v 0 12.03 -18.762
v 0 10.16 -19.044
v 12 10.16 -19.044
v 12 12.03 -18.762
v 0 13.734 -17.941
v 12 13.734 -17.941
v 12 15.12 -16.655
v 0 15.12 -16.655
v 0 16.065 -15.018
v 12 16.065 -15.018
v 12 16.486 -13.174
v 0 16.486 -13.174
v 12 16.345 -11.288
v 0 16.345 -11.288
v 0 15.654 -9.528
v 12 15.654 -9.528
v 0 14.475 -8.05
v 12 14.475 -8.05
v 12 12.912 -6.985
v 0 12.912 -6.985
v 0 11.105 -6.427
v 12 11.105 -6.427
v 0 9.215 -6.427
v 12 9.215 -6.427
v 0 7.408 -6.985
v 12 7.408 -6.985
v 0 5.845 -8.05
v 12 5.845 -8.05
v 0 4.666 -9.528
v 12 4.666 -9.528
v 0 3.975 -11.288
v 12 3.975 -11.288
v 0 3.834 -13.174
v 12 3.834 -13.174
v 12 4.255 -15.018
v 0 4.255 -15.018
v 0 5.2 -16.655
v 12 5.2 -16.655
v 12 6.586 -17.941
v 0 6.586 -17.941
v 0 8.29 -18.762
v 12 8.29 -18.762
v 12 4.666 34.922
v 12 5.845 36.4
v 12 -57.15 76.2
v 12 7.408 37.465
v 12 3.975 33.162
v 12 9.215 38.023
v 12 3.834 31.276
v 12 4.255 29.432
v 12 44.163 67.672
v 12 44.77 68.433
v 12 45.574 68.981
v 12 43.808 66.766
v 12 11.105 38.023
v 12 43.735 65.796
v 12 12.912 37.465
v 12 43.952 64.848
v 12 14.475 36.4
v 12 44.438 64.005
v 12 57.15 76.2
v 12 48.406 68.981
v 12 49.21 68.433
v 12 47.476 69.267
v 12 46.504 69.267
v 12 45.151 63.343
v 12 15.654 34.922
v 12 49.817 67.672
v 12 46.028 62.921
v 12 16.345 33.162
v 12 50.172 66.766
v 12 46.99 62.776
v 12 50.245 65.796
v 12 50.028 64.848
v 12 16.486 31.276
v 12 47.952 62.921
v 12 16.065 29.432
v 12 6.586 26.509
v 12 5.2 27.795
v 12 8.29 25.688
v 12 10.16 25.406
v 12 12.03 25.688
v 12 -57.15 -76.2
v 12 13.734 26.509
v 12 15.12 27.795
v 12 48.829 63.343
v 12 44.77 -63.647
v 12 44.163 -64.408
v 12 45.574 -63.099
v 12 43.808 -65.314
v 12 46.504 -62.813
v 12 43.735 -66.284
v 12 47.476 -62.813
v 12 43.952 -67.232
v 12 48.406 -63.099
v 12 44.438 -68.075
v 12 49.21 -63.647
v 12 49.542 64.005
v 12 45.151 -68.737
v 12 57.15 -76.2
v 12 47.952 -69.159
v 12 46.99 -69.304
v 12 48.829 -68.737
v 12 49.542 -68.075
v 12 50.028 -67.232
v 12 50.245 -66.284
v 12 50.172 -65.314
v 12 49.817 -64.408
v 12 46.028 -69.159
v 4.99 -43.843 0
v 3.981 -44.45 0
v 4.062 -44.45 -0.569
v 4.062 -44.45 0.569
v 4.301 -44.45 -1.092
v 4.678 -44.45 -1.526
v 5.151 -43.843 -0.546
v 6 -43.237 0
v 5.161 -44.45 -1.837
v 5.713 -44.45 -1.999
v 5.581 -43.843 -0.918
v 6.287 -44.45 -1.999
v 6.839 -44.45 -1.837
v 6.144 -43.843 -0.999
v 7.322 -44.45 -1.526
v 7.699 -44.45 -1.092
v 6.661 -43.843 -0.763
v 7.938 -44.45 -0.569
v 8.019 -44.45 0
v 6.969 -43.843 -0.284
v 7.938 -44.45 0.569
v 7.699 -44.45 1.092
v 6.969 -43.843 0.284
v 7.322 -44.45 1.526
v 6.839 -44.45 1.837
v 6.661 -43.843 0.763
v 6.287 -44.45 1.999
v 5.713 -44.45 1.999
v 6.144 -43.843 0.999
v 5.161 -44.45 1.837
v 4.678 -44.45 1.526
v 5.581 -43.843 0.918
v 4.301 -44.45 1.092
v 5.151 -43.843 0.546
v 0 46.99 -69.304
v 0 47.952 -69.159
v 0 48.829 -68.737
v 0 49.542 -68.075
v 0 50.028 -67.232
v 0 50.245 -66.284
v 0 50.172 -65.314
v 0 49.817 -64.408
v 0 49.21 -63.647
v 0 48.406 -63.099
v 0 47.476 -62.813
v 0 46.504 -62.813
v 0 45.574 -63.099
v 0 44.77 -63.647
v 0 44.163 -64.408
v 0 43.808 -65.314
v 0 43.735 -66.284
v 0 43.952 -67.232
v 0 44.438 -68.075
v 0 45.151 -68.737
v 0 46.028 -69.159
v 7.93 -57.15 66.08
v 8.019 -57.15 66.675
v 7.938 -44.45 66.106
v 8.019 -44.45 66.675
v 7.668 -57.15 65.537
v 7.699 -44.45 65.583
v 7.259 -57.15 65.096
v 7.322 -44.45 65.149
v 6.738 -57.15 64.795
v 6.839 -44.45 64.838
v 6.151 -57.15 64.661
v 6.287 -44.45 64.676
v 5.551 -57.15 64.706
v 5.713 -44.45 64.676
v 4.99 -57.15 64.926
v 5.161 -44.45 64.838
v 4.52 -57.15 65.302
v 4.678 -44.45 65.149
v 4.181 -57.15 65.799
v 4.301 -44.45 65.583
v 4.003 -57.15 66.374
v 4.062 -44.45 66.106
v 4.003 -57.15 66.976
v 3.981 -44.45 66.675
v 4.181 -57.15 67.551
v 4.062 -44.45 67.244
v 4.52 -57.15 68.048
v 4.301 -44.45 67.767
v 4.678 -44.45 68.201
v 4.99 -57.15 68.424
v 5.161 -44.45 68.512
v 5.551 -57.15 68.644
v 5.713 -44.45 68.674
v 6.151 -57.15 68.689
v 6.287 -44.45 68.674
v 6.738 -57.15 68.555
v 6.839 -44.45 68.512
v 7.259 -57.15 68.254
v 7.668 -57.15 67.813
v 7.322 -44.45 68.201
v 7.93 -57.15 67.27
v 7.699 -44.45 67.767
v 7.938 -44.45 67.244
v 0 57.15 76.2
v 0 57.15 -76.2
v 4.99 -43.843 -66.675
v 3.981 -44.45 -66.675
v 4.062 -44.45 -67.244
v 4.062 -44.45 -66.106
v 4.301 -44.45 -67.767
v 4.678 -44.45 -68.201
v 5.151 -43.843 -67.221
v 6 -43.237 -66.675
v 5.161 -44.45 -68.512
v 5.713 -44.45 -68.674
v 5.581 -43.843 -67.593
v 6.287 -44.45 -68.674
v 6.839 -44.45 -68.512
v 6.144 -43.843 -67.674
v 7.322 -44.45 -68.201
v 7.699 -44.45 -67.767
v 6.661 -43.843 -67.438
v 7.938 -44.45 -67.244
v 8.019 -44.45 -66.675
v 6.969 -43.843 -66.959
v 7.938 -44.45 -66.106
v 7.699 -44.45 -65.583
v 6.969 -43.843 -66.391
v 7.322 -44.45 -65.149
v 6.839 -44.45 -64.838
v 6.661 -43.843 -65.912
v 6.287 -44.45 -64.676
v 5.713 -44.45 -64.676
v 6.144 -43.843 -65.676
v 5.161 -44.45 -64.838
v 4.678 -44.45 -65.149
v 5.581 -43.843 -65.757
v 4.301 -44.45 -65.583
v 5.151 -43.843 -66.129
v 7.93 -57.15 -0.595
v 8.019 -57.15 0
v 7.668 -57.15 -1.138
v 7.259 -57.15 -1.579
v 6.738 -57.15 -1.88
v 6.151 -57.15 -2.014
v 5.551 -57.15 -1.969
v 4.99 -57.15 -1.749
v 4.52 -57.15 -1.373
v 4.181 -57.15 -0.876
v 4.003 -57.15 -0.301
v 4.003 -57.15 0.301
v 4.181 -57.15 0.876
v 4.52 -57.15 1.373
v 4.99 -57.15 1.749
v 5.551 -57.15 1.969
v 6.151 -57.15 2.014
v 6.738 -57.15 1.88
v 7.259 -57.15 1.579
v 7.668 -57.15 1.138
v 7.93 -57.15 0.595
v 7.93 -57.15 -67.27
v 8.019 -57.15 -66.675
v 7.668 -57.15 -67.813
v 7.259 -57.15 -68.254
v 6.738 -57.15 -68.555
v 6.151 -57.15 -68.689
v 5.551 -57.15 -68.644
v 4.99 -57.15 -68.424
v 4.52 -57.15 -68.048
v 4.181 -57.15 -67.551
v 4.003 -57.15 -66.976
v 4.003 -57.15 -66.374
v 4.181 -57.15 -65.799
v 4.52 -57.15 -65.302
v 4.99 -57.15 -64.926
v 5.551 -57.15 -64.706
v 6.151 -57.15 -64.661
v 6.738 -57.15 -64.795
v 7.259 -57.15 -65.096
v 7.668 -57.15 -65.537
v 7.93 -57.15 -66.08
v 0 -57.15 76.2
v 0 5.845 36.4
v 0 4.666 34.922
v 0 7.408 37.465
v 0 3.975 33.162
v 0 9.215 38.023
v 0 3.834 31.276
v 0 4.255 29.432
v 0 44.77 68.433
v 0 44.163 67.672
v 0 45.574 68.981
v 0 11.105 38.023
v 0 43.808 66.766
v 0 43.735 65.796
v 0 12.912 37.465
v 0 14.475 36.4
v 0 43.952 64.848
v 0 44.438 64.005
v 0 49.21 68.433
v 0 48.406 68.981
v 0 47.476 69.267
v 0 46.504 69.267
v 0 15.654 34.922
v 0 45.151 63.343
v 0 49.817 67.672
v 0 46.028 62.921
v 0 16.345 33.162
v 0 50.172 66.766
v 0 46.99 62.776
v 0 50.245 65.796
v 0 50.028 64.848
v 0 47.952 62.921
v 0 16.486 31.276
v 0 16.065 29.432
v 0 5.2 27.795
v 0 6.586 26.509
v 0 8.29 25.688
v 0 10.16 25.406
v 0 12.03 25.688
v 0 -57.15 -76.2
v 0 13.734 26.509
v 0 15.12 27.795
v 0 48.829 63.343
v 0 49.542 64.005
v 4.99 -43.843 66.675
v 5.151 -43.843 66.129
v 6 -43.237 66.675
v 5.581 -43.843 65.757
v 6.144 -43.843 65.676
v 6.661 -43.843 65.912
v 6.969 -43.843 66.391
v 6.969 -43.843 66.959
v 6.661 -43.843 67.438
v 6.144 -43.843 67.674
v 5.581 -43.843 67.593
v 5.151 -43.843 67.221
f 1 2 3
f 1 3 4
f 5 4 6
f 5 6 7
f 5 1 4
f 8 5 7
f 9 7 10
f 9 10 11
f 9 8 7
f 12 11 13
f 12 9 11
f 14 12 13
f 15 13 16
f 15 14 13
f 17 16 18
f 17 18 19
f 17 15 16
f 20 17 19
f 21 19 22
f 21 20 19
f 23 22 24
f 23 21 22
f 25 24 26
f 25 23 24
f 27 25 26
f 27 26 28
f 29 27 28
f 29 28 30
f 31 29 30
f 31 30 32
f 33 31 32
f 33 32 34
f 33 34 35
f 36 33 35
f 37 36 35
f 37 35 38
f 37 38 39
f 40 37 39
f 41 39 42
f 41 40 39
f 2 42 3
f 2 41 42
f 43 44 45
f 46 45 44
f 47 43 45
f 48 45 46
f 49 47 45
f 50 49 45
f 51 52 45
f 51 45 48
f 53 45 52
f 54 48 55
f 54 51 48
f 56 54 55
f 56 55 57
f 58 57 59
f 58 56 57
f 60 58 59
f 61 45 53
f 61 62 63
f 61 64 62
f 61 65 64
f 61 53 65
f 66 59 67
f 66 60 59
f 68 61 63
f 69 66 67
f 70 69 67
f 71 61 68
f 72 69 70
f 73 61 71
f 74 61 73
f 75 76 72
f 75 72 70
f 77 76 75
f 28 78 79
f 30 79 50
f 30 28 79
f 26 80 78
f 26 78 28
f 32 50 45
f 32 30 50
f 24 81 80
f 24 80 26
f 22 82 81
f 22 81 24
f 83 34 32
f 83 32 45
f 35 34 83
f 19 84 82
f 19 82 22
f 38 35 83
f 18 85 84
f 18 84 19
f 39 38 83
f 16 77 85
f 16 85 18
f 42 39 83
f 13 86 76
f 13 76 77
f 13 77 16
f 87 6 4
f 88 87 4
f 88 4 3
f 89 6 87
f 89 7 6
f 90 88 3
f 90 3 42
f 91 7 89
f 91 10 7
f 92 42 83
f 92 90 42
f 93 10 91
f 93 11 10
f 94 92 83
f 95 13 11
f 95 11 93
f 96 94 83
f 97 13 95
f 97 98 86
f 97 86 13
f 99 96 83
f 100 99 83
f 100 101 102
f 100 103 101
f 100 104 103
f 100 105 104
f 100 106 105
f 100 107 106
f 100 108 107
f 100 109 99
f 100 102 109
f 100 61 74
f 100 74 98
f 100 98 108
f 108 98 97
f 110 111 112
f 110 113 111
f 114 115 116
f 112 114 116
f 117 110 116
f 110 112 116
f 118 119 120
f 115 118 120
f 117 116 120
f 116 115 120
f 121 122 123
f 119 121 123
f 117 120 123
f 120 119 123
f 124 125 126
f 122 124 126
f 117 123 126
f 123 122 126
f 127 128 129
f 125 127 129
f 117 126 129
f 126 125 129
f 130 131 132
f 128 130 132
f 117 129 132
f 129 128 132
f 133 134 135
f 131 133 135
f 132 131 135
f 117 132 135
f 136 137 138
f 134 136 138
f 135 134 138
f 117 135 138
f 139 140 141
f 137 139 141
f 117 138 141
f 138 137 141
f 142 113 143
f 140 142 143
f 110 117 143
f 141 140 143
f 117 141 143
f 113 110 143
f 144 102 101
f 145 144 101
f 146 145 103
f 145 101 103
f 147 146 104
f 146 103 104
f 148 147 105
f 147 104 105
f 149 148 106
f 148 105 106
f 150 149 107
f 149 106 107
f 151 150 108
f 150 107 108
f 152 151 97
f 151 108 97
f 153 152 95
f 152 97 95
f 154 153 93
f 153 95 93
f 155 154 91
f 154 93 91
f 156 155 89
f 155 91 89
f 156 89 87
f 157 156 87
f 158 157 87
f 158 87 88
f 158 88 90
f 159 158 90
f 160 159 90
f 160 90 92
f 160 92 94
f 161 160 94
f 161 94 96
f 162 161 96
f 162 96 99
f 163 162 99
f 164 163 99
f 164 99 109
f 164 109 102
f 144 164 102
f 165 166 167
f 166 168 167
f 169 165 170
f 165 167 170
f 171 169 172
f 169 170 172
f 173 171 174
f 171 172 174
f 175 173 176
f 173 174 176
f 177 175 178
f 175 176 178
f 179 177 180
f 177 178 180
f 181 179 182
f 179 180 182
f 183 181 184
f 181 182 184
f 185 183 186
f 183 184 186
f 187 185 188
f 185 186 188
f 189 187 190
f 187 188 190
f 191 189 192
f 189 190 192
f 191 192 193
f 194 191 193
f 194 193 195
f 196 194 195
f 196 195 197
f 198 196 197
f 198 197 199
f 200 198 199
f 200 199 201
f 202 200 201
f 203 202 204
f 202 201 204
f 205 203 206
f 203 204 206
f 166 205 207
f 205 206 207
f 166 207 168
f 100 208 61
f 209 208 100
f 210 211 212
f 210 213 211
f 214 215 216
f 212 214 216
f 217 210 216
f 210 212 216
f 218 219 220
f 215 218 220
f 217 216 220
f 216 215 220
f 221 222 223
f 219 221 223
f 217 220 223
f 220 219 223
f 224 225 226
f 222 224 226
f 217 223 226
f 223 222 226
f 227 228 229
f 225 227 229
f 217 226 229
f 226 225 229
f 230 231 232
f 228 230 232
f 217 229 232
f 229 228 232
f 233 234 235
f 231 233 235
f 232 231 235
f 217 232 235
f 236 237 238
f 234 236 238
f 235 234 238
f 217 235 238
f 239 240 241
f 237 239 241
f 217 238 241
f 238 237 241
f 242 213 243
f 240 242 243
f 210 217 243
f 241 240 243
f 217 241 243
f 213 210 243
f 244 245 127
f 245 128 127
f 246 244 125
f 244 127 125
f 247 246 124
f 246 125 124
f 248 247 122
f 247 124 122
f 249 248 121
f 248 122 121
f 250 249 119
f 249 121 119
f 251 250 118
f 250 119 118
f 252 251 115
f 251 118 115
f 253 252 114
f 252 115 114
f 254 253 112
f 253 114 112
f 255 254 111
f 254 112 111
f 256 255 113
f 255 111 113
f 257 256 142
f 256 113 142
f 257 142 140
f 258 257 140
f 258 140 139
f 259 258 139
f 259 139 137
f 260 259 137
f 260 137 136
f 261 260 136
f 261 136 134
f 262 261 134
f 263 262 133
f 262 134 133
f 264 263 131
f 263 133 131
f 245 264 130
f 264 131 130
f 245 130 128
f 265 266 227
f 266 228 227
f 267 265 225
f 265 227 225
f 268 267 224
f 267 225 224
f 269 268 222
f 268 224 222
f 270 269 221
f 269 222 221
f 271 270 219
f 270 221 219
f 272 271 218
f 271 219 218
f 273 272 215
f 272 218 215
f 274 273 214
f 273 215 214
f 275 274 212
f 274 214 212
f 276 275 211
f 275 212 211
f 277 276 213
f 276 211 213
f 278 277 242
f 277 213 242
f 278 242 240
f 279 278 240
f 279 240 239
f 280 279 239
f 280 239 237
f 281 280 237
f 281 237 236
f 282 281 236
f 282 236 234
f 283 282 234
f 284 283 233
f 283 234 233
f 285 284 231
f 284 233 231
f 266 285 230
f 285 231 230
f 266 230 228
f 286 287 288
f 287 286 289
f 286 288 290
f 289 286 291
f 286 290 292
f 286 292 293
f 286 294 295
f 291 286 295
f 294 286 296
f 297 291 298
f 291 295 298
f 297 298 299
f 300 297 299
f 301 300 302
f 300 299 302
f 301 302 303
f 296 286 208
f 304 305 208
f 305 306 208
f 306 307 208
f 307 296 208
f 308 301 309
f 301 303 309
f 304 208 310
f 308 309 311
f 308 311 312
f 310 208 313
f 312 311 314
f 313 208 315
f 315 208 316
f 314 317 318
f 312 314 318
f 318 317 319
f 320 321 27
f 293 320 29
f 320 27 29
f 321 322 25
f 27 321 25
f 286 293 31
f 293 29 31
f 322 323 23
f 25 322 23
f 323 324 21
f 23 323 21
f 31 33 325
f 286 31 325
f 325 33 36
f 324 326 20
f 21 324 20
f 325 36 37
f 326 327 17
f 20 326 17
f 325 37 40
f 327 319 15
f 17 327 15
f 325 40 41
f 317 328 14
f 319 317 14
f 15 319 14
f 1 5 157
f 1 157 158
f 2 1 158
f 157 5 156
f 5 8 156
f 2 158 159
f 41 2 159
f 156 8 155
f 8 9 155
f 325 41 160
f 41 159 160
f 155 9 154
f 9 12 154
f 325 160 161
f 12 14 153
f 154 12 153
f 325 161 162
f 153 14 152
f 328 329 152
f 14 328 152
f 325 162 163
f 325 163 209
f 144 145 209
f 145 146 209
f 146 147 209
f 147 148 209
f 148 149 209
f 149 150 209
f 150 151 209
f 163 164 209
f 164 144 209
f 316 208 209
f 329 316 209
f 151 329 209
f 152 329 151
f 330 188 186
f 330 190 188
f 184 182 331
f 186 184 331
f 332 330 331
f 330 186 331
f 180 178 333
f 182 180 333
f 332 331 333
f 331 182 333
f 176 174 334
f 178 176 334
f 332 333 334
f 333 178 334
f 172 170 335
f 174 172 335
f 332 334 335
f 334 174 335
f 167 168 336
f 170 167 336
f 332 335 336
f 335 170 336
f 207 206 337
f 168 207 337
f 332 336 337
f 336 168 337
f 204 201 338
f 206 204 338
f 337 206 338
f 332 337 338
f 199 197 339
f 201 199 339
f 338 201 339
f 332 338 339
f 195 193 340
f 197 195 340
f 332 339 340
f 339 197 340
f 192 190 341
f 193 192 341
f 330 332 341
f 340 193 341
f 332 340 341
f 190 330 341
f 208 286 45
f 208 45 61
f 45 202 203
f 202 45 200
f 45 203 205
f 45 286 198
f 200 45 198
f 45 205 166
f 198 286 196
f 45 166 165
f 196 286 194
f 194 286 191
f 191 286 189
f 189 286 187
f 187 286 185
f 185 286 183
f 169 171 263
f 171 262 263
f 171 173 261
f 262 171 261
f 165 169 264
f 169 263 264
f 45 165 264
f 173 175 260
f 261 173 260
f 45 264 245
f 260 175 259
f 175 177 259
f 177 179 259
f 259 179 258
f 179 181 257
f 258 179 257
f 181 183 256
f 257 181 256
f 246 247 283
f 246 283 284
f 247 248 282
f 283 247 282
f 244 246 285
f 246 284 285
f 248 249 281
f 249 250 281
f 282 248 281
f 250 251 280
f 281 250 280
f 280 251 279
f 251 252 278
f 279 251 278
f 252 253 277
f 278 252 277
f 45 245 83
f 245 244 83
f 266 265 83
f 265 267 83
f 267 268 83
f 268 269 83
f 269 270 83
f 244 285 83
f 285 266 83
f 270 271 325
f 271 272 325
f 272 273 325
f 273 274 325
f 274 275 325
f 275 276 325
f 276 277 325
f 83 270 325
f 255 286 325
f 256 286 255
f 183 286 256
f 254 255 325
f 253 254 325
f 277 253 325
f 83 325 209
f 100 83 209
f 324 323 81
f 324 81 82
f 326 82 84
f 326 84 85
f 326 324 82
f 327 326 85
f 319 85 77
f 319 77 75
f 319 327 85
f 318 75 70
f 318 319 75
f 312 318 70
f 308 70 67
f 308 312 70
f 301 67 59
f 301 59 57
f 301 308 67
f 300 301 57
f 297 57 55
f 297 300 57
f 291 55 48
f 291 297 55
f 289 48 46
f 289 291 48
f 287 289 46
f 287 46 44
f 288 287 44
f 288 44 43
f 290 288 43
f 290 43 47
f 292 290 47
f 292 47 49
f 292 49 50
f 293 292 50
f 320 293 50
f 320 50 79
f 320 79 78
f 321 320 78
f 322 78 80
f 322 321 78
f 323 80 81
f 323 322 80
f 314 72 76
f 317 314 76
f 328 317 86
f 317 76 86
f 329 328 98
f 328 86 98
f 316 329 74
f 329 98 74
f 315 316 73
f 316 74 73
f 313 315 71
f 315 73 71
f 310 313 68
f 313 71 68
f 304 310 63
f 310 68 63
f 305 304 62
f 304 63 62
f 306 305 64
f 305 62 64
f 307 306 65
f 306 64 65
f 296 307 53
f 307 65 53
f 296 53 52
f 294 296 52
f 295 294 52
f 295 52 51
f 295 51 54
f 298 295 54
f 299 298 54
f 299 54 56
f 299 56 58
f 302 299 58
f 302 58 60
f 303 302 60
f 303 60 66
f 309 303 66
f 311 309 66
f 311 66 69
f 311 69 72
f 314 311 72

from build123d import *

# Parameters (mm, degrees)
SKETCH1_W                      = 152.4
SKETCH1_H                      = 114.3
SKETCH1_R                      = 6.34365
BOSS_EXTRUDE1_DEPTH            = 12
TAP_DRILL_FOR_10_32_TAP1_D     = 4.0386
TAP_DRILL_FOR_10_32_TAP1_DEPTH = 12.7
TAP_DRILL_FOR_10_32_TAP1_TIP   = 1.213317848
F_1_4_CLEARANCE_HOLE1_D        = 6.5278
F_1_4_CLEARANCE_HOLE1_DEPTH    = 12.7
F_1_4_CLEARANCE_HOLE1_TIP      = 1.961148974


with BuildPart() as part:
    # Sketch1 → Boss-Extrude1 (new body)
    with BuildSketch(Plane(origin=(0, 0, 0), x_dir=(0, 0, -1), z_dir=(1, 0, 0))):
        Rectangle(SKETCH1_W, SKETCH1_H)
        with Locations((-31.75, 10.16)):
            Circle(SKETCH1_R, mode=Mode.SUBTRACT)
        with Locations((12.7, 10.16)):
            Circle(SKETCH1_R, mode=Mode.SUBTRACT)
    extrude(amount=BOSS_EXTRUDE1_DEPTH)

    # Tap Drill for #10-32 Tap1
    with Locations(Plane(origin=(0, -57.15, 0), x_dir=(-1, 0, 0), z_dir=(0, -1, 0))):
        with Locations((-6, -66.675), (-6, 0), (-6, 66.675)):
            Hole(TAP_DRILL_FOR_10_32_TAP1_D / 2, depth=TAP_DRILL_FOR_10_32_TAP1_DEPTH)
            with Locations((0, 0, -(TAP_DRILL_FOR_10_32_TAP1_DEPTH + TAP_DRILL_FOR_10_32_TAP1_TIP / 2))):  # 118° drill point
                Cone(0, TAP_DRILL_FOR_10_32_TAP1_D / 2, TAP_DRILL_FOR_10_32_TAP1_TIP, mode=Mode.SUBTRACT)

    # 1/4 Clearance Hole1
    with Locations(Plane.ZY):
        with Locations((-66.04, 46.99), (66.04, 46.99)):
            Hole(F_1_4_CLEARANCE_HOLE1_D / 2, depth=F_1_4_CLEARANCE_HOLE1_DEPTH)
            with Locations((0, 0, -(F_1_4_CLEARANCE_HOLE1_DEPTH + F_1_4_CLEARANCE_HOLE1_TIP / 2))):  # 118° drill point
                Cone(0, F_1_4_CLEARANCE_HOLE1_D / 2, F_1_4_CLEARANCE_HOLE1_TIP, mode=Mode.SUBTRACT)


solid = part.part
